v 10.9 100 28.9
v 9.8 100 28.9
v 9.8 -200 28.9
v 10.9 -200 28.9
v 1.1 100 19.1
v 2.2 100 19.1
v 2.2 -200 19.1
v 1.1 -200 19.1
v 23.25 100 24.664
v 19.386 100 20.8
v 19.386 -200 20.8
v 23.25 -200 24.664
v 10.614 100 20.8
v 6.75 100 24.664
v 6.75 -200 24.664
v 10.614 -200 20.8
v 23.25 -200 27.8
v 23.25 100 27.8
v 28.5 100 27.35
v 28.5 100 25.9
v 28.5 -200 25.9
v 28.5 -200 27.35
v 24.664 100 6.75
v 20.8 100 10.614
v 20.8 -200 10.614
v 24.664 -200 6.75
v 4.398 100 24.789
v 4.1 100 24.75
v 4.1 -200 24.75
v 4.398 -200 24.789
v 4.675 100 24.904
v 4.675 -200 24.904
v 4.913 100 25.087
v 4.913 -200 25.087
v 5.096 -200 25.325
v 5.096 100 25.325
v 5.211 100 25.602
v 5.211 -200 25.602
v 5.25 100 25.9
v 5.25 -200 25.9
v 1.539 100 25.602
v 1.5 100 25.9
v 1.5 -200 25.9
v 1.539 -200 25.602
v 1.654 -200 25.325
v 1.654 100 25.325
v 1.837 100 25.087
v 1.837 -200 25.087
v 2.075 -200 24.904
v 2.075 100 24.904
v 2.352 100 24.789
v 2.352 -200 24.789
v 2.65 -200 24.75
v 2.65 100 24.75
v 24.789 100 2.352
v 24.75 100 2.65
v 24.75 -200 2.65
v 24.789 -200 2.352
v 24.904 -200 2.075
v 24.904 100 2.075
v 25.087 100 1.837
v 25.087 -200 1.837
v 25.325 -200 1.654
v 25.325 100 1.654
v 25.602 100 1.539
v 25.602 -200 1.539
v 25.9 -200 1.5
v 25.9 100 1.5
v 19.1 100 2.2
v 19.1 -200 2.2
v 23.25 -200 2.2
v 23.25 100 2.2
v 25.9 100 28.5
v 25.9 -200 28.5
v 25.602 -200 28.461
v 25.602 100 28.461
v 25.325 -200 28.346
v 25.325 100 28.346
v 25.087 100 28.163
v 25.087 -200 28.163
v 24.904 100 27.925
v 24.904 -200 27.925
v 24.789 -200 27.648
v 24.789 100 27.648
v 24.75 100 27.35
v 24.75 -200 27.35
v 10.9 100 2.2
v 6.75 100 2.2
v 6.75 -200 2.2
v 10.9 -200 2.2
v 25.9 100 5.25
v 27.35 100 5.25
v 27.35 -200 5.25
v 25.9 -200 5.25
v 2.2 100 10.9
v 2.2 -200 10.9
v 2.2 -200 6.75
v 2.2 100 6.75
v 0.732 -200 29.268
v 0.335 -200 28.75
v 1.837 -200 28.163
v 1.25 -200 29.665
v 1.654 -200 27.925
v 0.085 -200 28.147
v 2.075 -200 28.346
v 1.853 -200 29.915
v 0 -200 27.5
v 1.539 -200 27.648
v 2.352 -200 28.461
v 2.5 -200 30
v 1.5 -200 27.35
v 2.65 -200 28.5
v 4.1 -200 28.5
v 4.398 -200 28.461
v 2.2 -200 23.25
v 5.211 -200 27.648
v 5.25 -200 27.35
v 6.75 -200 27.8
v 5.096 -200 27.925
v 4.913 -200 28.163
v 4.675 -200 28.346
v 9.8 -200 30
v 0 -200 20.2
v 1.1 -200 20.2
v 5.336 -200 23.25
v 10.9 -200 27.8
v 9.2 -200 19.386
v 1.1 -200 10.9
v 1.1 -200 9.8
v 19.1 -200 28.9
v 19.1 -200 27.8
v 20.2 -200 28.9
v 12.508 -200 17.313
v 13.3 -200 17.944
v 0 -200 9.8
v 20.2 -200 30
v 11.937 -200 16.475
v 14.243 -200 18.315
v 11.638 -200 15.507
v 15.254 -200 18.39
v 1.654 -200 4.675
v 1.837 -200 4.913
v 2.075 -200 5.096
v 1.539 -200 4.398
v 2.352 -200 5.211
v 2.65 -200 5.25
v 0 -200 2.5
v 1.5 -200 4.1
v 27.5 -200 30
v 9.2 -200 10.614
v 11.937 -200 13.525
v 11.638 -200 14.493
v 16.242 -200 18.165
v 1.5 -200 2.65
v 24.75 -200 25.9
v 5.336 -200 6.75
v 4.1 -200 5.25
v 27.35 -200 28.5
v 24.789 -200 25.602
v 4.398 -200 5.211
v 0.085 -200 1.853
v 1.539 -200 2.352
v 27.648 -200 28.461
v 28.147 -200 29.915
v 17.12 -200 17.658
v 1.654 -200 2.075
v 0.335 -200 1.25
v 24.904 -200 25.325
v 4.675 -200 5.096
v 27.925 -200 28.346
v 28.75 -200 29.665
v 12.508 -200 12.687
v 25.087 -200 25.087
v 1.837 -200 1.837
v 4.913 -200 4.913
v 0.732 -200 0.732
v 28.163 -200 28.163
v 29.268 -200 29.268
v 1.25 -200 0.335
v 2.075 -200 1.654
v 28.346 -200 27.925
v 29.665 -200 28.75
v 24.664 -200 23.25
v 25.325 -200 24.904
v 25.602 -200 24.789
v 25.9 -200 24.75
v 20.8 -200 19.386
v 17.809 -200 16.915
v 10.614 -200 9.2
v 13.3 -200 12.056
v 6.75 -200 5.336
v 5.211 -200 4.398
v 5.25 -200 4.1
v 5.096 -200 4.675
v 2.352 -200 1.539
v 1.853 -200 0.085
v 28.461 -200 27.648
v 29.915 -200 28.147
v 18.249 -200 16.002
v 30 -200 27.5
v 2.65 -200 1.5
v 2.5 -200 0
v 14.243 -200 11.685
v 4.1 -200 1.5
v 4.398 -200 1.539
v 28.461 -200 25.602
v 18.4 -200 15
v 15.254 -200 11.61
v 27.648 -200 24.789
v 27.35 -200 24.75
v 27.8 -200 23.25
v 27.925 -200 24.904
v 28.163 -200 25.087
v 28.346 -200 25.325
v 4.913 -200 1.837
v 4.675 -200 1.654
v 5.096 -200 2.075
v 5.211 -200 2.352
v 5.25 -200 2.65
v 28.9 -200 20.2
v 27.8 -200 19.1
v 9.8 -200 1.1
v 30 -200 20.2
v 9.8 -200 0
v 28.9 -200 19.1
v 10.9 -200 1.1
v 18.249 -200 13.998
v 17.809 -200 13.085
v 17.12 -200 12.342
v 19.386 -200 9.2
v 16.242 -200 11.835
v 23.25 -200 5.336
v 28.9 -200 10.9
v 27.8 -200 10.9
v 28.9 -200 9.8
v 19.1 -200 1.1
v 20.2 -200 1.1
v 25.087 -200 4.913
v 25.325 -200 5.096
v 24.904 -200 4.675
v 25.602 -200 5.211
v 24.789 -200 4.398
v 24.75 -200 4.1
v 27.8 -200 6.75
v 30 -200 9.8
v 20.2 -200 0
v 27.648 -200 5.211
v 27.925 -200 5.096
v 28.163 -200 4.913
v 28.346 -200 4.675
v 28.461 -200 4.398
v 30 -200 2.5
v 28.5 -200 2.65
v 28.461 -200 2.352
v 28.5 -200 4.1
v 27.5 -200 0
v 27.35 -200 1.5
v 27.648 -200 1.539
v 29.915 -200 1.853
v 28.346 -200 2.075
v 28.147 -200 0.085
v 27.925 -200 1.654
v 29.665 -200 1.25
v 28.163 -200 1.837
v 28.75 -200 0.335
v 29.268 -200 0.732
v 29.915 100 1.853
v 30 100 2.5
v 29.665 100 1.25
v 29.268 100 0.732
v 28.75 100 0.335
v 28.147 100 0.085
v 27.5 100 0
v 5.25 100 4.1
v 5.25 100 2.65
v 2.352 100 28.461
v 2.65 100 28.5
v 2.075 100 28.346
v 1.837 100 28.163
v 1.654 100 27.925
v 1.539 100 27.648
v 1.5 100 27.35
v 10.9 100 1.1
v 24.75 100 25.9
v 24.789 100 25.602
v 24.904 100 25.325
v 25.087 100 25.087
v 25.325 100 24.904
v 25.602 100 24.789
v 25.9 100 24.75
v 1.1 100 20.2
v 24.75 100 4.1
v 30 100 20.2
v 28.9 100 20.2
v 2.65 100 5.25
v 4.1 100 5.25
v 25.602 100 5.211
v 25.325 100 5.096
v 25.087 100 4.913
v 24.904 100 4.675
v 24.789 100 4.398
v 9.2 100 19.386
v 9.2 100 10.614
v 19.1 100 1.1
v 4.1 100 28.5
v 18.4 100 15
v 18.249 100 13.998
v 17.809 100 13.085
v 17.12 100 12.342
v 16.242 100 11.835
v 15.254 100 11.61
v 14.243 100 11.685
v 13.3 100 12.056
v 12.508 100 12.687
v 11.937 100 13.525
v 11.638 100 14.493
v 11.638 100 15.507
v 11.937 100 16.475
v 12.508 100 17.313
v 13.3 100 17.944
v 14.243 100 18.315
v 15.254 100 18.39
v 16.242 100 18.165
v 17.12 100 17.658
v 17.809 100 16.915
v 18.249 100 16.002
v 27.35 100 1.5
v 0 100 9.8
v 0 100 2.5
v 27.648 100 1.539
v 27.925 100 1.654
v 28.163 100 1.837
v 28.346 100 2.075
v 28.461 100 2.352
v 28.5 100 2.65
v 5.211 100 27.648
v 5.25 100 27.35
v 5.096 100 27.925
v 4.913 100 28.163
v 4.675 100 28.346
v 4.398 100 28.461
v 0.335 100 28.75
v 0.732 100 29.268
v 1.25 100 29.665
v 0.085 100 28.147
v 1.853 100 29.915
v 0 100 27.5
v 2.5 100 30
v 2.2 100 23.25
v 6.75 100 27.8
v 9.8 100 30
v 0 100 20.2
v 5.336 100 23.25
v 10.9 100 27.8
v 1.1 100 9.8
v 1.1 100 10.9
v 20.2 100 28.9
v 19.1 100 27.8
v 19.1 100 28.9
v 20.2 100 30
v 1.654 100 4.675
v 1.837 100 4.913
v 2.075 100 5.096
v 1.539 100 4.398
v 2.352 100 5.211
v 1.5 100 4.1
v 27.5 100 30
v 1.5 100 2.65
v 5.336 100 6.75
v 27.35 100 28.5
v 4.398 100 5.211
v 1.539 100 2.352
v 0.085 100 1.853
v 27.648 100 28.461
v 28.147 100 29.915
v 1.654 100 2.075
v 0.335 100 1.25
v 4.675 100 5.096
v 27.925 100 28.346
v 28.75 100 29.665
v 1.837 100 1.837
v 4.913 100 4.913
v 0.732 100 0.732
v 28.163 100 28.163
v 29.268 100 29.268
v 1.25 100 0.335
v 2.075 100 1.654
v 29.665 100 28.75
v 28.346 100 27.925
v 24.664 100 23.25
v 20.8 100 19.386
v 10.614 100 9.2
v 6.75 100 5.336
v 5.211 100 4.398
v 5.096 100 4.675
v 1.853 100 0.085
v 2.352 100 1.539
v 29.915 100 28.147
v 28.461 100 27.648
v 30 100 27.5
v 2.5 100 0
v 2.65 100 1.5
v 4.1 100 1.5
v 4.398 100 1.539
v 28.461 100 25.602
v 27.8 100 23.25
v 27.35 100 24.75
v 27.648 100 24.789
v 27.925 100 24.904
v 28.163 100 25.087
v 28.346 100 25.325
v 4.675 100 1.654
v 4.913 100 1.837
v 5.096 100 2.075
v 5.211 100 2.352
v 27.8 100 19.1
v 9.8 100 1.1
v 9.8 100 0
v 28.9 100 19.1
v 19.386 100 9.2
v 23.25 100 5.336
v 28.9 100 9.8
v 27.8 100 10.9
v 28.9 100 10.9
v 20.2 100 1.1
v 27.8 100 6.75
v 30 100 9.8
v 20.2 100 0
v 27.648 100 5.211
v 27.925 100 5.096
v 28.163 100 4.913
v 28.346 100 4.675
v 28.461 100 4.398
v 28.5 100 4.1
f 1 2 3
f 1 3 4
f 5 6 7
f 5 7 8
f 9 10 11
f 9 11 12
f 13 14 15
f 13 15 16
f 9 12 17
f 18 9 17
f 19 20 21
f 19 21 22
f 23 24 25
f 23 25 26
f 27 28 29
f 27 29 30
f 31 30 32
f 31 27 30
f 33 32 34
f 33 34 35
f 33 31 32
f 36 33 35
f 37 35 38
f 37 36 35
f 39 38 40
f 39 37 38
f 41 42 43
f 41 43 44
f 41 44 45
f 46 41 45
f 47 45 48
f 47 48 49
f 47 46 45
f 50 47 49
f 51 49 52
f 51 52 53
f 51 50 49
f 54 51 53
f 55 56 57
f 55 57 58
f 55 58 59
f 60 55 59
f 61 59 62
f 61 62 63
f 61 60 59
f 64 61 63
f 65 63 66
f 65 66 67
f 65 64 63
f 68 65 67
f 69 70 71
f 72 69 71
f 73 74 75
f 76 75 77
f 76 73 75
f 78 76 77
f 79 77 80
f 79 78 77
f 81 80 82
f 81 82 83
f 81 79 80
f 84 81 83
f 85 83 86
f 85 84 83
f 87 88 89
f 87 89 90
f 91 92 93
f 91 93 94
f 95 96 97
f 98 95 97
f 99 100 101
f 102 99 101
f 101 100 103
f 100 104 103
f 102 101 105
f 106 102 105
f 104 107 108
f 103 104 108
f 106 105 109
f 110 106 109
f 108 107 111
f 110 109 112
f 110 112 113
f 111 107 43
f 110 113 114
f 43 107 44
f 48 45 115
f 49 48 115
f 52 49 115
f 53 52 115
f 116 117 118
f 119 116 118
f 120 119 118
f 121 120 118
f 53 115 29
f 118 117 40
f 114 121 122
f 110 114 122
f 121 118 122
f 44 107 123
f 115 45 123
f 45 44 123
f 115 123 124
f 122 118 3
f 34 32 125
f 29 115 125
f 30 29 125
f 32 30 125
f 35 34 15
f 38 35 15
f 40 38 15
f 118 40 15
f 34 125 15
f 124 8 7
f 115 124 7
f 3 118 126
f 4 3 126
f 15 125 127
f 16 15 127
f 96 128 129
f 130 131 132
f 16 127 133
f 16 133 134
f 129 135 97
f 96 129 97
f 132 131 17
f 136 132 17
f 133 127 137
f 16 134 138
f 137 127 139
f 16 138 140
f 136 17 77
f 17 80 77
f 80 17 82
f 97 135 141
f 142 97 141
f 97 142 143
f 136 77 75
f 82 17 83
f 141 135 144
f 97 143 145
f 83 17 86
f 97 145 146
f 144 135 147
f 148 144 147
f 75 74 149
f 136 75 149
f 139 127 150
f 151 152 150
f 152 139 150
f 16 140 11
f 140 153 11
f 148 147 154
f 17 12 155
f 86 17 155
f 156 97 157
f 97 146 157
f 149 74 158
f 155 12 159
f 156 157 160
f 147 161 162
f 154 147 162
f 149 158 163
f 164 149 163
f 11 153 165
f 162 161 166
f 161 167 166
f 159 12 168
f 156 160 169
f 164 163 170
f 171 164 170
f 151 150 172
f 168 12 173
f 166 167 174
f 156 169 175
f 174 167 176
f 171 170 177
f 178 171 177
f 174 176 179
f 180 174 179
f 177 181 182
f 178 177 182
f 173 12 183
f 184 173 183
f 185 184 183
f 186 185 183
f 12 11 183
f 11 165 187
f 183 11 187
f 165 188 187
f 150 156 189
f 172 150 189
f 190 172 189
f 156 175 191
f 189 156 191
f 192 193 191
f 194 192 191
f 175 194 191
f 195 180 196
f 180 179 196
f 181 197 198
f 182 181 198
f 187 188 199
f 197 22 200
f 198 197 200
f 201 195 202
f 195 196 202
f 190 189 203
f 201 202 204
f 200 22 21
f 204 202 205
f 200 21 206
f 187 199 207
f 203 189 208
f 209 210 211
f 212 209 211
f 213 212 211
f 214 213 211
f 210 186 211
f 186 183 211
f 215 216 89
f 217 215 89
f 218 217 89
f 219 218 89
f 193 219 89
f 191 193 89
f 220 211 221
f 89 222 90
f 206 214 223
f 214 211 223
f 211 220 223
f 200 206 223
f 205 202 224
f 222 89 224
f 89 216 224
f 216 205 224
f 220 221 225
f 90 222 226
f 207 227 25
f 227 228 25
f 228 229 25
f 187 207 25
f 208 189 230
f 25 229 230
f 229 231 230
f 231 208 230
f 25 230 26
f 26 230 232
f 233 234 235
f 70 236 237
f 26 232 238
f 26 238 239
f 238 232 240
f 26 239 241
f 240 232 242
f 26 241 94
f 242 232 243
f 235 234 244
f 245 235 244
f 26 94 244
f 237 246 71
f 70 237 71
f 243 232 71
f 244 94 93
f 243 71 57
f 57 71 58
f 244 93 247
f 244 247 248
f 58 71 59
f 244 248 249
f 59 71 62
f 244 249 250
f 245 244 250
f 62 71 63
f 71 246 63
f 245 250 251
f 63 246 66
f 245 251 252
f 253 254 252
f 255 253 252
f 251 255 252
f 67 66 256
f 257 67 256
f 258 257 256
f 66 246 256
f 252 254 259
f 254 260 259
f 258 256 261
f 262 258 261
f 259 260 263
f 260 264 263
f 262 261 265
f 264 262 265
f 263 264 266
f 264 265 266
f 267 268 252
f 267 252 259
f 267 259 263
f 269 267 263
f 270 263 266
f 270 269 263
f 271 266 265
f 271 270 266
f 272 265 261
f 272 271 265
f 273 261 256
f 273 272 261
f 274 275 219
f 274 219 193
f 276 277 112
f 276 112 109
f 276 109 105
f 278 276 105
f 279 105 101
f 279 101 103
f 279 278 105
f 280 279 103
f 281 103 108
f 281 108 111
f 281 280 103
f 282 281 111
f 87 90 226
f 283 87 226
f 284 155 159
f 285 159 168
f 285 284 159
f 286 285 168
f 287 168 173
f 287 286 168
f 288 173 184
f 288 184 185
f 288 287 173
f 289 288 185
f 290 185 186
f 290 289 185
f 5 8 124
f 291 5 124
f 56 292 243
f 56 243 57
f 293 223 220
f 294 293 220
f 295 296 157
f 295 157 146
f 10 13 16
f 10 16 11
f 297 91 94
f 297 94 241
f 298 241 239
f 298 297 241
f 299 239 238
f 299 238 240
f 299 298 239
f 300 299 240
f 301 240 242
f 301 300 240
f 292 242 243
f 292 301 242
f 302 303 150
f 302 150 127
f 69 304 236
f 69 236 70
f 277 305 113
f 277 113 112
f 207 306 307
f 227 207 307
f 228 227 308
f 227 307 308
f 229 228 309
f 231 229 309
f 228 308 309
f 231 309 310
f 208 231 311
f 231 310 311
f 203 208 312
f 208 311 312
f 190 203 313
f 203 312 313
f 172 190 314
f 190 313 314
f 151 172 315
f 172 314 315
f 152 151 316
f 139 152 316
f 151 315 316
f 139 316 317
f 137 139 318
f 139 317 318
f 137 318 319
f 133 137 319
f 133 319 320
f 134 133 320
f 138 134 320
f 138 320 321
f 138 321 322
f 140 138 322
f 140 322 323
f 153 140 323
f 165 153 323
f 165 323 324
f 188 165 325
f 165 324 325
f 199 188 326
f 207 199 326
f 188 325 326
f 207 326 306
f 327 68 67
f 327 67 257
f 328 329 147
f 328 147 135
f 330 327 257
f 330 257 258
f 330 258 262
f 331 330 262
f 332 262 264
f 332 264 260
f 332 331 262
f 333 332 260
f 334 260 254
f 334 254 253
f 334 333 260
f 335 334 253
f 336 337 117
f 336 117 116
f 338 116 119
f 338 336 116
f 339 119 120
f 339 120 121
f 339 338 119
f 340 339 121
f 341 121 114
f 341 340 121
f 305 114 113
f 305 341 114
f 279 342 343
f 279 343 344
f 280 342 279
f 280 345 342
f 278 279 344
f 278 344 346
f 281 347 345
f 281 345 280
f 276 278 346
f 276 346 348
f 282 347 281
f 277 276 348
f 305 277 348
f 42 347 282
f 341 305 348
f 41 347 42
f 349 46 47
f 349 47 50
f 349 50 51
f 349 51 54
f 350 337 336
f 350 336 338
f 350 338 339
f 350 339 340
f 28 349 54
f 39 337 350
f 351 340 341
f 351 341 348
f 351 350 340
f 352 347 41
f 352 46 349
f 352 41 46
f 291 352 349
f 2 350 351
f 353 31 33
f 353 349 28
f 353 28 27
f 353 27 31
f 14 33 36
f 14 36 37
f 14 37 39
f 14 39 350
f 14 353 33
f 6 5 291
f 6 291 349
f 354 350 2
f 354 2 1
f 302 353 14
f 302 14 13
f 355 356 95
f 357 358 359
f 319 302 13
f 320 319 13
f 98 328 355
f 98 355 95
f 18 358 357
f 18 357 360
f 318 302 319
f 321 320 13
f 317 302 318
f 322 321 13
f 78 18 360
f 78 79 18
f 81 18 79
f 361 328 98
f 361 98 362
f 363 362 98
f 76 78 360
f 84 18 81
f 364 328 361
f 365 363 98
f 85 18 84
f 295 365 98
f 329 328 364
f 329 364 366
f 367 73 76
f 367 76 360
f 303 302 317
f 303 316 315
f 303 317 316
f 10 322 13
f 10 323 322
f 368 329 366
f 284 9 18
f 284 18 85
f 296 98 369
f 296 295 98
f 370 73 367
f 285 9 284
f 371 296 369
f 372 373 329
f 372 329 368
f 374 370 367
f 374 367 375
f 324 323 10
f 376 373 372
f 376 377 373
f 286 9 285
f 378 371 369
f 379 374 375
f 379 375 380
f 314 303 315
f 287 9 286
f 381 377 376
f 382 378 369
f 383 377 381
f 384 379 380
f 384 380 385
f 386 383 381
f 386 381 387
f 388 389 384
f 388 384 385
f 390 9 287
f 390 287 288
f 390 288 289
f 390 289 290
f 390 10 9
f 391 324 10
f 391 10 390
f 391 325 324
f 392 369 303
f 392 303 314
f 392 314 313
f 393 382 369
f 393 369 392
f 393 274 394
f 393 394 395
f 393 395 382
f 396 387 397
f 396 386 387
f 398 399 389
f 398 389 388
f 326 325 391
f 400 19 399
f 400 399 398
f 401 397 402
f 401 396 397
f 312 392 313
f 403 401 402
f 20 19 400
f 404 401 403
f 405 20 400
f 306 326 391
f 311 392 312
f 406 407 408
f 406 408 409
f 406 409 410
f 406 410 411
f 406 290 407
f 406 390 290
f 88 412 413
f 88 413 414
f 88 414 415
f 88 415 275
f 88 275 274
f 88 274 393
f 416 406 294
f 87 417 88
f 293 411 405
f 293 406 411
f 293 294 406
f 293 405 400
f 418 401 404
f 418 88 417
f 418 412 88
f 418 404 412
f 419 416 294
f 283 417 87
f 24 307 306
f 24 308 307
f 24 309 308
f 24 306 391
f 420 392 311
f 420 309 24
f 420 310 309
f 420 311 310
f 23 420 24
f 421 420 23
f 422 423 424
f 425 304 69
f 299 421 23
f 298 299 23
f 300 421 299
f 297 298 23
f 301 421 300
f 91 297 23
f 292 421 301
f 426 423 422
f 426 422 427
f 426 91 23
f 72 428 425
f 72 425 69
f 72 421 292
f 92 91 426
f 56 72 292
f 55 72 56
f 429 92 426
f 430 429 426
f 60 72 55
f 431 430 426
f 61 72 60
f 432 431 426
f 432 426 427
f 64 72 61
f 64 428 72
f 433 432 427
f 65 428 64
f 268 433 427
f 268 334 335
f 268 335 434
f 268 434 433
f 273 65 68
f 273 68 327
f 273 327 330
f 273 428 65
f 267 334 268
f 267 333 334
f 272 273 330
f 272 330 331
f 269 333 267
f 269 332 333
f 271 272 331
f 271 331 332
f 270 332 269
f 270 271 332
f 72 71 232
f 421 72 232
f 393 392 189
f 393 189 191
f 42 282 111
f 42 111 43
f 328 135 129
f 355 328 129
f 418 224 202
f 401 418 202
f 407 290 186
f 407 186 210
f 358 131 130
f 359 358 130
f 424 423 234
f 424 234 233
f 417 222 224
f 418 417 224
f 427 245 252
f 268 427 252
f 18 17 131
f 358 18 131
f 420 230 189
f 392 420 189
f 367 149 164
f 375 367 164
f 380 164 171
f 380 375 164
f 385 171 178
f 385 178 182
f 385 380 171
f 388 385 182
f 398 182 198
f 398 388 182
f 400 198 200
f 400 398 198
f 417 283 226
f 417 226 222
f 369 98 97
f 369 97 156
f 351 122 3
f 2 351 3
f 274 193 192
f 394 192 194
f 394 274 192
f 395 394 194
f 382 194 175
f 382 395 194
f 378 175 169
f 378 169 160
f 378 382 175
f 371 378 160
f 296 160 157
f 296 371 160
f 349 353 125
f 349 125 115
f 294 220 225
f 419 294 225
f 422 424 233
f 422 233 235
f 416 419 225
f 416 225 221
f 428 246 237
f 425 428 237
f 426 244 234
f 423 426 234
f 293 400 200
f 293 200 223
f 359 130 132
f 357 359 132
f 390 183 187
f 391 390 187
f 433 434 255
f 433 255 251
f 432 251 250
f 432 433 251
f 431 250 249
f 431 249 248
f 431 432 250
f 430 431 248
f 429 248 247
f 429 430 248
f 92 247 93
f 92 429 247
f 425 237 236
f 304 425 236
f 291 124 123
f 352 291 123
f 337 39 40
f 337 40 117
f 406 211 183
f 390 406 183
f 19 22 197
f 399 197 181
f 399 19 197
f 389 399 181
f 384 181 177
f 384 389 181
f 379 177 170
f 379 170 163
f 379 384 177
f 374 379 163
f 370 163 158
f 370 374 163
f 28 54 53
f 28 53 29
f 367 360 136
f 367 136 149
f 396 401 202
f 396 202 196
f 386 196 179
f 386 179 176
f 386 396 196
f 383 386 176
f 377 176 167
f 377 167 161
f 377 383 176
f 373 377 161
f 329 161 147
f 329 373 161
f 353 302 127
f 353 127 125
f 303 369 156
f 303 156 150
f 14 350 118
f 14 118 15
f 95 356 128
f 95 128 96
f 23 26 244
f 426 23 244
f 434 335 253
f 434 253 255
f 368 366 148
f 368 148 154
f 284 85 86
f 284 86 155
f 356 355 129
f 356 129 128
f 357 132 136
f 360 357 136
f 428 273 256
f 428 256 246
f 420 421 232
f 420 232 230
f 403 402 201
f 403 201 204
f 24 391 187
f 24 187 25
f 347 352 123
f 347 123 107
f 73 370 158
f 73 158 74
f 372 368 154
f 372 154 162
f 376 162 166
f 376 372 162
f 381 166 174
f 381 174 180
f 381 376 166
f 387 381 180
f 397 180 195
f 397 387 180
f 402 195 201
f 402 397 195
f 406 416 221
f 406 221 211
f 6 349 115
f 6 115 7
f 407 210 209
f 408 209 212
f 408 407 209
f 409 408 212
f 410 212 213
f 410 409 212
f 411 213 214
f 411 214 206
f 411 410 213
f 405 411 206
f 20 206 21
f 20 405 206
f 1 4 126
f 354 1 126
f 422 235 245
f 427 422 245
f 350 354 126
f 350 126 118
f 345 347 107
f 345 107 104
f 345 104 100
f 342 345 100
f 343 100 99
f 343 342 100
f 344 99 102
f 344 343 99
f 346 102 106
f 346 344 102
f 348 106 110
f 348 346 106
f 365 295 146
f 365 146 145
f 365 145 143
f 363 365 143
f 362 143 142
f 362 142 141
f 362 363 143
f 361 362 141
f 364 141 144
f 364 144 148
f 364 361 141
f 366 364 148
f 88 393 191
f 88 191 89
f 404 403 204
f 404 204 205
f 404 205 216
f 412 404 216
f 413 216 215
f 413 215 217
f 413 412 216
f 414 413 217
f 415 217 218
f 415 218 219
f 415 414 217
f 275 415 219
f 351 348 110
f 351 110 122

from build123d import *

# Parameters (mm, degrees)
SKETCH1_R           = 3.4
BOSS_EXTRUDE1_DEPTH = 300


with BuildPart() as part:
    # Sketch1 → Boss-Extrude1 (new body)
    with BuildSketch(Plane(origin=(0, 100, 0), x_dir=(1, 0, 0), z_dir=(0, 1, 0))):
        with BuildLine():
            Line((27.5, 0), (20.200000224, 0))
            Line((20.200000224, 0), (20.200000224, -1.1))
            Line((20.200000224, -1.1), (19.1, -1.1))
            Line((19.1, -1.1), (19.1, -2.2))
            Line((19.1, -2.2), (23.249999989, -2.2))
            Line((23.249999989, -2.2), (23.249999989, -5.335786427))
            Line((23.249999989, -5.335786427), (19.385786417, -9.2))
            Line((19.385786417, -9.2), (10.614213562, -9.2))
            Line((10.614213562, -9.2), (6.75, -5.335786438))
            Line((6.75, -5.335786438), (6.75, -2.2))
            Line((6.75, -2.2), (10.9, -2.2))
            Line((10.9, -2.2), (10.9, -1.1))
            Line((10.9, -1.1), (9.799999776, -1.1))
            Line((9.799999776, -1.1), (9.799999776, 0))
            Line((9.799999776, 0), (2.5, 0))
            ThreePointArc((2.5, 0), (0.732233047, -0.732233047), (0, -2.5))
            Line((0, -2.5), (0, -9.799999776))
            Line((0, -9.799999776), (1.1, -9.799999776))
            Line((1.1, -9.799999776), (1.1, -10.9))
            Line((1.1, -10.9), (2.199999979, -10.9))
            Line((2.199999979, -10.9), (2.199999979, -6.750000011))
            Line((2.199999979, -6.750000011), (5.335786427, -6.750000011))
            Line((5.335786427, -6.750000011), (9.199999989, -10.614213573))
            Line((9.199999989, -10.614213573), (9.199999989, -19.385786427))
            Line((9.199999989, -19.385786427), (5.335786417, -23.25))
            Line((5.335786417, -23.25), (2.199999979, -23.25))
            Line((2.199999979, -23.25), (2.199999979, -19.1))
            Line((2.199999979, -19.1), (1.1, -19.1))
            Line((1.1, -19.1), (1.1, -20.200000224))
            Line((1.1, -20.200000224), (0, -20.200000224))
            Line((0, -20.200000224), (0, -27.5))
            ThreePointArc((0, -27.5), (0.732233047, -29.267766953), (2.5, -30))
            Line((2.5, -30), (9.799999776, -30))
            Line((9.799999776, -30), (9.799999776, -28.9))
            Line((9.799999776, -28.9), (10.9, -28.9))
            Line((10.9, -28.9), (10.9, -27.8))
            Line((10.9, -27.8), (6.75, -27.8))
            Line((6.75, -27.8), (6.75, -24.664213562))
            Line((6.75, -24.664213562), (10.614213562, -20.8))
            Line((10.614213562, -20.8), (19.385786417, -20.8))
            Line((19.385786417, -20.8), (23.249999989, -24.664213573))
            Line((23.249999989, -24.664213573), (23.249999989, -27.8))
            Line((23.249999989, -27.8), (19.1, -27.8))
            Line((19.1, -27.8), (19.1, -28.9))
            Line((19.1, -28.9), (20.200000224, -28.9))
            Line((20.200000224, -28.9), (20.200000224, -30))
            Line((20.200000224, -30), (27.5, -30))
            ThreePointArc((27.5, -30), (29.267766953, -29.267766953), (30, -27.5))
            Line((30, -27.5), (30, -20.200000224))
            Line((30, -20.200000224), (28.9, -20.200000224))
            Line((28.9, -20.200000224), (28.9, -19.1))
            Line((28.9, -19.1), (27.799999979, -19.1))
            Line((27.799999979, -19.1), (27.799999979, -23.25))
            Line((27.799999979, -23.25), (24.664213562, -23.25))
            Line((24.664213562, -23.25), (20.799999989, -19.385786427))
            Line((20.799999989, -19.385786427), (20.799999989, -10.614213573))
            Line((20.799999989, -10.614213573), (24.664213552, -6.750000011))
            Line((24.664213552, -6.750000011), (27.799999979, -6.750000011))
            Line((27.799999979, -6.750000011), (27.799999979, -10.9))
            Line((27.799999979, -10.9), (28.9, -10.9))
            Line((28.9, -10.9), (28.9, -9.799999776))
            Line((28.9, -9.799999776), (30, -9.799999776))
            Line((30, -9.799999776), (30, -2.5))
            ThreePointArc((30, -2.5), (29.267766953, -0.732233047), (27.5, 0))
        make_face()
        with Locations((15, -15)):
            Circle(SKETCH1_R, mode=Mode.SUBTRACT)
        with BuildLine():
            Line((28.5, -25.9), (28.5, -27.35))
            ThreePointArc((28.5, -27.35), (28.163172798, -28.163172798), (27.35, -28.5))
            Line((27.35, -28.5), (25.9, -28.5))
            ThreePointArc((25.9, -28.5), (25.086827202, -28.163172798), (24.75, -27.35))
            Line((24.75, -27.35), (24.75, -25.9))
            ThreePointArc((24.75, -25.9), (25.086827202, -25.086827202), (25.9, -24.75))
            Line((25.9, -24.75), (27.35, -24.75))
            ThreePointArc((27.35, -24.75), (28.163172798, -25.086827202), (28.5, -25.9))
        make_face(mode=Mode.SUBTRACT)
        with BuildLine():
            Line((1.5, -27.35), (1.5, -25.9))
            ThreePointArc((1.5, -25.9), (1.836827202, -25.086827202), (2.65, -24.75))
            Line((2.65, -24.75), (4.1, -24.75))
            ThreePointArc((4.1, -24.75), (4.913172798, -25.086827202), (5.25, -25.9))
            Line((5.25, -25.9), (5.25, -27.35))
            ThreePointArc((5.25, -27.35), (4.913172798, -28.163172798), (4.1, -28.5))
            Line((4.1, -28.5), (2.65, -28.5))
            ThreePointArc((2.65, -28.5), (1.836827202, -28.163172798), (1.5, -27.35))
        make_face(mode=Mode.SUBTRACT)
        with BuildLine():
            Line((2.65, -1.5), (4.1, -1.5))
            ThreePointArc((4.1, -1.5), (4.913172798, -1.836827202), (5.25, -2.65))
            Line((5.25, -2.65), (5.25, -4.1))
            ThreePointArc((5.25, -4.1), (4.913172798, -4.913172798), (4.1, -5.25))
            Line((4.1, -5.25), (2.65, -5.25))
            ThreePointArc((2.65, -5.25), (1.836827202, -4.913172798), (1.5, -4.1))
            Line((1.5, -4.1), (1.5, -2.65))
            ThreePointArc((1.5, -2.65), (1.836827202, -1.836827202), (2.65, -1.5))
        make_face(mode=Mode.SUBTRACT)
        with BuildLine():
            Line((28.5, -2.65), (28.5, -4.1))
            ThreePointArc((28.5, -4.1), (28.163172798, -4.913172798), (27.35, -5.25))
            Line((27.35, -5.25), (25.9, -5.25))
            ThreePointArc((25.9, -5.25), (25.086827202, -4.913172798), (24.75, -4.1))
            Line((24.75, -4.1), (24.75, -2.65))
            ThreePointArc((24.75, -2.65), (25.086827202, -1.836827202), (25.9, -1.5))
            Line((25.9, -1.5), (27.35, -1.5))
            ThreePointArc((27.35, -1.5), (28.163172798, -1.836827202), (28.5, -2.65))
        make_face(mode=Mode.SUBTRACT)
    extrude(amount=-BOSS_EXTRUDE1_DEPTH)


solid = part.part
